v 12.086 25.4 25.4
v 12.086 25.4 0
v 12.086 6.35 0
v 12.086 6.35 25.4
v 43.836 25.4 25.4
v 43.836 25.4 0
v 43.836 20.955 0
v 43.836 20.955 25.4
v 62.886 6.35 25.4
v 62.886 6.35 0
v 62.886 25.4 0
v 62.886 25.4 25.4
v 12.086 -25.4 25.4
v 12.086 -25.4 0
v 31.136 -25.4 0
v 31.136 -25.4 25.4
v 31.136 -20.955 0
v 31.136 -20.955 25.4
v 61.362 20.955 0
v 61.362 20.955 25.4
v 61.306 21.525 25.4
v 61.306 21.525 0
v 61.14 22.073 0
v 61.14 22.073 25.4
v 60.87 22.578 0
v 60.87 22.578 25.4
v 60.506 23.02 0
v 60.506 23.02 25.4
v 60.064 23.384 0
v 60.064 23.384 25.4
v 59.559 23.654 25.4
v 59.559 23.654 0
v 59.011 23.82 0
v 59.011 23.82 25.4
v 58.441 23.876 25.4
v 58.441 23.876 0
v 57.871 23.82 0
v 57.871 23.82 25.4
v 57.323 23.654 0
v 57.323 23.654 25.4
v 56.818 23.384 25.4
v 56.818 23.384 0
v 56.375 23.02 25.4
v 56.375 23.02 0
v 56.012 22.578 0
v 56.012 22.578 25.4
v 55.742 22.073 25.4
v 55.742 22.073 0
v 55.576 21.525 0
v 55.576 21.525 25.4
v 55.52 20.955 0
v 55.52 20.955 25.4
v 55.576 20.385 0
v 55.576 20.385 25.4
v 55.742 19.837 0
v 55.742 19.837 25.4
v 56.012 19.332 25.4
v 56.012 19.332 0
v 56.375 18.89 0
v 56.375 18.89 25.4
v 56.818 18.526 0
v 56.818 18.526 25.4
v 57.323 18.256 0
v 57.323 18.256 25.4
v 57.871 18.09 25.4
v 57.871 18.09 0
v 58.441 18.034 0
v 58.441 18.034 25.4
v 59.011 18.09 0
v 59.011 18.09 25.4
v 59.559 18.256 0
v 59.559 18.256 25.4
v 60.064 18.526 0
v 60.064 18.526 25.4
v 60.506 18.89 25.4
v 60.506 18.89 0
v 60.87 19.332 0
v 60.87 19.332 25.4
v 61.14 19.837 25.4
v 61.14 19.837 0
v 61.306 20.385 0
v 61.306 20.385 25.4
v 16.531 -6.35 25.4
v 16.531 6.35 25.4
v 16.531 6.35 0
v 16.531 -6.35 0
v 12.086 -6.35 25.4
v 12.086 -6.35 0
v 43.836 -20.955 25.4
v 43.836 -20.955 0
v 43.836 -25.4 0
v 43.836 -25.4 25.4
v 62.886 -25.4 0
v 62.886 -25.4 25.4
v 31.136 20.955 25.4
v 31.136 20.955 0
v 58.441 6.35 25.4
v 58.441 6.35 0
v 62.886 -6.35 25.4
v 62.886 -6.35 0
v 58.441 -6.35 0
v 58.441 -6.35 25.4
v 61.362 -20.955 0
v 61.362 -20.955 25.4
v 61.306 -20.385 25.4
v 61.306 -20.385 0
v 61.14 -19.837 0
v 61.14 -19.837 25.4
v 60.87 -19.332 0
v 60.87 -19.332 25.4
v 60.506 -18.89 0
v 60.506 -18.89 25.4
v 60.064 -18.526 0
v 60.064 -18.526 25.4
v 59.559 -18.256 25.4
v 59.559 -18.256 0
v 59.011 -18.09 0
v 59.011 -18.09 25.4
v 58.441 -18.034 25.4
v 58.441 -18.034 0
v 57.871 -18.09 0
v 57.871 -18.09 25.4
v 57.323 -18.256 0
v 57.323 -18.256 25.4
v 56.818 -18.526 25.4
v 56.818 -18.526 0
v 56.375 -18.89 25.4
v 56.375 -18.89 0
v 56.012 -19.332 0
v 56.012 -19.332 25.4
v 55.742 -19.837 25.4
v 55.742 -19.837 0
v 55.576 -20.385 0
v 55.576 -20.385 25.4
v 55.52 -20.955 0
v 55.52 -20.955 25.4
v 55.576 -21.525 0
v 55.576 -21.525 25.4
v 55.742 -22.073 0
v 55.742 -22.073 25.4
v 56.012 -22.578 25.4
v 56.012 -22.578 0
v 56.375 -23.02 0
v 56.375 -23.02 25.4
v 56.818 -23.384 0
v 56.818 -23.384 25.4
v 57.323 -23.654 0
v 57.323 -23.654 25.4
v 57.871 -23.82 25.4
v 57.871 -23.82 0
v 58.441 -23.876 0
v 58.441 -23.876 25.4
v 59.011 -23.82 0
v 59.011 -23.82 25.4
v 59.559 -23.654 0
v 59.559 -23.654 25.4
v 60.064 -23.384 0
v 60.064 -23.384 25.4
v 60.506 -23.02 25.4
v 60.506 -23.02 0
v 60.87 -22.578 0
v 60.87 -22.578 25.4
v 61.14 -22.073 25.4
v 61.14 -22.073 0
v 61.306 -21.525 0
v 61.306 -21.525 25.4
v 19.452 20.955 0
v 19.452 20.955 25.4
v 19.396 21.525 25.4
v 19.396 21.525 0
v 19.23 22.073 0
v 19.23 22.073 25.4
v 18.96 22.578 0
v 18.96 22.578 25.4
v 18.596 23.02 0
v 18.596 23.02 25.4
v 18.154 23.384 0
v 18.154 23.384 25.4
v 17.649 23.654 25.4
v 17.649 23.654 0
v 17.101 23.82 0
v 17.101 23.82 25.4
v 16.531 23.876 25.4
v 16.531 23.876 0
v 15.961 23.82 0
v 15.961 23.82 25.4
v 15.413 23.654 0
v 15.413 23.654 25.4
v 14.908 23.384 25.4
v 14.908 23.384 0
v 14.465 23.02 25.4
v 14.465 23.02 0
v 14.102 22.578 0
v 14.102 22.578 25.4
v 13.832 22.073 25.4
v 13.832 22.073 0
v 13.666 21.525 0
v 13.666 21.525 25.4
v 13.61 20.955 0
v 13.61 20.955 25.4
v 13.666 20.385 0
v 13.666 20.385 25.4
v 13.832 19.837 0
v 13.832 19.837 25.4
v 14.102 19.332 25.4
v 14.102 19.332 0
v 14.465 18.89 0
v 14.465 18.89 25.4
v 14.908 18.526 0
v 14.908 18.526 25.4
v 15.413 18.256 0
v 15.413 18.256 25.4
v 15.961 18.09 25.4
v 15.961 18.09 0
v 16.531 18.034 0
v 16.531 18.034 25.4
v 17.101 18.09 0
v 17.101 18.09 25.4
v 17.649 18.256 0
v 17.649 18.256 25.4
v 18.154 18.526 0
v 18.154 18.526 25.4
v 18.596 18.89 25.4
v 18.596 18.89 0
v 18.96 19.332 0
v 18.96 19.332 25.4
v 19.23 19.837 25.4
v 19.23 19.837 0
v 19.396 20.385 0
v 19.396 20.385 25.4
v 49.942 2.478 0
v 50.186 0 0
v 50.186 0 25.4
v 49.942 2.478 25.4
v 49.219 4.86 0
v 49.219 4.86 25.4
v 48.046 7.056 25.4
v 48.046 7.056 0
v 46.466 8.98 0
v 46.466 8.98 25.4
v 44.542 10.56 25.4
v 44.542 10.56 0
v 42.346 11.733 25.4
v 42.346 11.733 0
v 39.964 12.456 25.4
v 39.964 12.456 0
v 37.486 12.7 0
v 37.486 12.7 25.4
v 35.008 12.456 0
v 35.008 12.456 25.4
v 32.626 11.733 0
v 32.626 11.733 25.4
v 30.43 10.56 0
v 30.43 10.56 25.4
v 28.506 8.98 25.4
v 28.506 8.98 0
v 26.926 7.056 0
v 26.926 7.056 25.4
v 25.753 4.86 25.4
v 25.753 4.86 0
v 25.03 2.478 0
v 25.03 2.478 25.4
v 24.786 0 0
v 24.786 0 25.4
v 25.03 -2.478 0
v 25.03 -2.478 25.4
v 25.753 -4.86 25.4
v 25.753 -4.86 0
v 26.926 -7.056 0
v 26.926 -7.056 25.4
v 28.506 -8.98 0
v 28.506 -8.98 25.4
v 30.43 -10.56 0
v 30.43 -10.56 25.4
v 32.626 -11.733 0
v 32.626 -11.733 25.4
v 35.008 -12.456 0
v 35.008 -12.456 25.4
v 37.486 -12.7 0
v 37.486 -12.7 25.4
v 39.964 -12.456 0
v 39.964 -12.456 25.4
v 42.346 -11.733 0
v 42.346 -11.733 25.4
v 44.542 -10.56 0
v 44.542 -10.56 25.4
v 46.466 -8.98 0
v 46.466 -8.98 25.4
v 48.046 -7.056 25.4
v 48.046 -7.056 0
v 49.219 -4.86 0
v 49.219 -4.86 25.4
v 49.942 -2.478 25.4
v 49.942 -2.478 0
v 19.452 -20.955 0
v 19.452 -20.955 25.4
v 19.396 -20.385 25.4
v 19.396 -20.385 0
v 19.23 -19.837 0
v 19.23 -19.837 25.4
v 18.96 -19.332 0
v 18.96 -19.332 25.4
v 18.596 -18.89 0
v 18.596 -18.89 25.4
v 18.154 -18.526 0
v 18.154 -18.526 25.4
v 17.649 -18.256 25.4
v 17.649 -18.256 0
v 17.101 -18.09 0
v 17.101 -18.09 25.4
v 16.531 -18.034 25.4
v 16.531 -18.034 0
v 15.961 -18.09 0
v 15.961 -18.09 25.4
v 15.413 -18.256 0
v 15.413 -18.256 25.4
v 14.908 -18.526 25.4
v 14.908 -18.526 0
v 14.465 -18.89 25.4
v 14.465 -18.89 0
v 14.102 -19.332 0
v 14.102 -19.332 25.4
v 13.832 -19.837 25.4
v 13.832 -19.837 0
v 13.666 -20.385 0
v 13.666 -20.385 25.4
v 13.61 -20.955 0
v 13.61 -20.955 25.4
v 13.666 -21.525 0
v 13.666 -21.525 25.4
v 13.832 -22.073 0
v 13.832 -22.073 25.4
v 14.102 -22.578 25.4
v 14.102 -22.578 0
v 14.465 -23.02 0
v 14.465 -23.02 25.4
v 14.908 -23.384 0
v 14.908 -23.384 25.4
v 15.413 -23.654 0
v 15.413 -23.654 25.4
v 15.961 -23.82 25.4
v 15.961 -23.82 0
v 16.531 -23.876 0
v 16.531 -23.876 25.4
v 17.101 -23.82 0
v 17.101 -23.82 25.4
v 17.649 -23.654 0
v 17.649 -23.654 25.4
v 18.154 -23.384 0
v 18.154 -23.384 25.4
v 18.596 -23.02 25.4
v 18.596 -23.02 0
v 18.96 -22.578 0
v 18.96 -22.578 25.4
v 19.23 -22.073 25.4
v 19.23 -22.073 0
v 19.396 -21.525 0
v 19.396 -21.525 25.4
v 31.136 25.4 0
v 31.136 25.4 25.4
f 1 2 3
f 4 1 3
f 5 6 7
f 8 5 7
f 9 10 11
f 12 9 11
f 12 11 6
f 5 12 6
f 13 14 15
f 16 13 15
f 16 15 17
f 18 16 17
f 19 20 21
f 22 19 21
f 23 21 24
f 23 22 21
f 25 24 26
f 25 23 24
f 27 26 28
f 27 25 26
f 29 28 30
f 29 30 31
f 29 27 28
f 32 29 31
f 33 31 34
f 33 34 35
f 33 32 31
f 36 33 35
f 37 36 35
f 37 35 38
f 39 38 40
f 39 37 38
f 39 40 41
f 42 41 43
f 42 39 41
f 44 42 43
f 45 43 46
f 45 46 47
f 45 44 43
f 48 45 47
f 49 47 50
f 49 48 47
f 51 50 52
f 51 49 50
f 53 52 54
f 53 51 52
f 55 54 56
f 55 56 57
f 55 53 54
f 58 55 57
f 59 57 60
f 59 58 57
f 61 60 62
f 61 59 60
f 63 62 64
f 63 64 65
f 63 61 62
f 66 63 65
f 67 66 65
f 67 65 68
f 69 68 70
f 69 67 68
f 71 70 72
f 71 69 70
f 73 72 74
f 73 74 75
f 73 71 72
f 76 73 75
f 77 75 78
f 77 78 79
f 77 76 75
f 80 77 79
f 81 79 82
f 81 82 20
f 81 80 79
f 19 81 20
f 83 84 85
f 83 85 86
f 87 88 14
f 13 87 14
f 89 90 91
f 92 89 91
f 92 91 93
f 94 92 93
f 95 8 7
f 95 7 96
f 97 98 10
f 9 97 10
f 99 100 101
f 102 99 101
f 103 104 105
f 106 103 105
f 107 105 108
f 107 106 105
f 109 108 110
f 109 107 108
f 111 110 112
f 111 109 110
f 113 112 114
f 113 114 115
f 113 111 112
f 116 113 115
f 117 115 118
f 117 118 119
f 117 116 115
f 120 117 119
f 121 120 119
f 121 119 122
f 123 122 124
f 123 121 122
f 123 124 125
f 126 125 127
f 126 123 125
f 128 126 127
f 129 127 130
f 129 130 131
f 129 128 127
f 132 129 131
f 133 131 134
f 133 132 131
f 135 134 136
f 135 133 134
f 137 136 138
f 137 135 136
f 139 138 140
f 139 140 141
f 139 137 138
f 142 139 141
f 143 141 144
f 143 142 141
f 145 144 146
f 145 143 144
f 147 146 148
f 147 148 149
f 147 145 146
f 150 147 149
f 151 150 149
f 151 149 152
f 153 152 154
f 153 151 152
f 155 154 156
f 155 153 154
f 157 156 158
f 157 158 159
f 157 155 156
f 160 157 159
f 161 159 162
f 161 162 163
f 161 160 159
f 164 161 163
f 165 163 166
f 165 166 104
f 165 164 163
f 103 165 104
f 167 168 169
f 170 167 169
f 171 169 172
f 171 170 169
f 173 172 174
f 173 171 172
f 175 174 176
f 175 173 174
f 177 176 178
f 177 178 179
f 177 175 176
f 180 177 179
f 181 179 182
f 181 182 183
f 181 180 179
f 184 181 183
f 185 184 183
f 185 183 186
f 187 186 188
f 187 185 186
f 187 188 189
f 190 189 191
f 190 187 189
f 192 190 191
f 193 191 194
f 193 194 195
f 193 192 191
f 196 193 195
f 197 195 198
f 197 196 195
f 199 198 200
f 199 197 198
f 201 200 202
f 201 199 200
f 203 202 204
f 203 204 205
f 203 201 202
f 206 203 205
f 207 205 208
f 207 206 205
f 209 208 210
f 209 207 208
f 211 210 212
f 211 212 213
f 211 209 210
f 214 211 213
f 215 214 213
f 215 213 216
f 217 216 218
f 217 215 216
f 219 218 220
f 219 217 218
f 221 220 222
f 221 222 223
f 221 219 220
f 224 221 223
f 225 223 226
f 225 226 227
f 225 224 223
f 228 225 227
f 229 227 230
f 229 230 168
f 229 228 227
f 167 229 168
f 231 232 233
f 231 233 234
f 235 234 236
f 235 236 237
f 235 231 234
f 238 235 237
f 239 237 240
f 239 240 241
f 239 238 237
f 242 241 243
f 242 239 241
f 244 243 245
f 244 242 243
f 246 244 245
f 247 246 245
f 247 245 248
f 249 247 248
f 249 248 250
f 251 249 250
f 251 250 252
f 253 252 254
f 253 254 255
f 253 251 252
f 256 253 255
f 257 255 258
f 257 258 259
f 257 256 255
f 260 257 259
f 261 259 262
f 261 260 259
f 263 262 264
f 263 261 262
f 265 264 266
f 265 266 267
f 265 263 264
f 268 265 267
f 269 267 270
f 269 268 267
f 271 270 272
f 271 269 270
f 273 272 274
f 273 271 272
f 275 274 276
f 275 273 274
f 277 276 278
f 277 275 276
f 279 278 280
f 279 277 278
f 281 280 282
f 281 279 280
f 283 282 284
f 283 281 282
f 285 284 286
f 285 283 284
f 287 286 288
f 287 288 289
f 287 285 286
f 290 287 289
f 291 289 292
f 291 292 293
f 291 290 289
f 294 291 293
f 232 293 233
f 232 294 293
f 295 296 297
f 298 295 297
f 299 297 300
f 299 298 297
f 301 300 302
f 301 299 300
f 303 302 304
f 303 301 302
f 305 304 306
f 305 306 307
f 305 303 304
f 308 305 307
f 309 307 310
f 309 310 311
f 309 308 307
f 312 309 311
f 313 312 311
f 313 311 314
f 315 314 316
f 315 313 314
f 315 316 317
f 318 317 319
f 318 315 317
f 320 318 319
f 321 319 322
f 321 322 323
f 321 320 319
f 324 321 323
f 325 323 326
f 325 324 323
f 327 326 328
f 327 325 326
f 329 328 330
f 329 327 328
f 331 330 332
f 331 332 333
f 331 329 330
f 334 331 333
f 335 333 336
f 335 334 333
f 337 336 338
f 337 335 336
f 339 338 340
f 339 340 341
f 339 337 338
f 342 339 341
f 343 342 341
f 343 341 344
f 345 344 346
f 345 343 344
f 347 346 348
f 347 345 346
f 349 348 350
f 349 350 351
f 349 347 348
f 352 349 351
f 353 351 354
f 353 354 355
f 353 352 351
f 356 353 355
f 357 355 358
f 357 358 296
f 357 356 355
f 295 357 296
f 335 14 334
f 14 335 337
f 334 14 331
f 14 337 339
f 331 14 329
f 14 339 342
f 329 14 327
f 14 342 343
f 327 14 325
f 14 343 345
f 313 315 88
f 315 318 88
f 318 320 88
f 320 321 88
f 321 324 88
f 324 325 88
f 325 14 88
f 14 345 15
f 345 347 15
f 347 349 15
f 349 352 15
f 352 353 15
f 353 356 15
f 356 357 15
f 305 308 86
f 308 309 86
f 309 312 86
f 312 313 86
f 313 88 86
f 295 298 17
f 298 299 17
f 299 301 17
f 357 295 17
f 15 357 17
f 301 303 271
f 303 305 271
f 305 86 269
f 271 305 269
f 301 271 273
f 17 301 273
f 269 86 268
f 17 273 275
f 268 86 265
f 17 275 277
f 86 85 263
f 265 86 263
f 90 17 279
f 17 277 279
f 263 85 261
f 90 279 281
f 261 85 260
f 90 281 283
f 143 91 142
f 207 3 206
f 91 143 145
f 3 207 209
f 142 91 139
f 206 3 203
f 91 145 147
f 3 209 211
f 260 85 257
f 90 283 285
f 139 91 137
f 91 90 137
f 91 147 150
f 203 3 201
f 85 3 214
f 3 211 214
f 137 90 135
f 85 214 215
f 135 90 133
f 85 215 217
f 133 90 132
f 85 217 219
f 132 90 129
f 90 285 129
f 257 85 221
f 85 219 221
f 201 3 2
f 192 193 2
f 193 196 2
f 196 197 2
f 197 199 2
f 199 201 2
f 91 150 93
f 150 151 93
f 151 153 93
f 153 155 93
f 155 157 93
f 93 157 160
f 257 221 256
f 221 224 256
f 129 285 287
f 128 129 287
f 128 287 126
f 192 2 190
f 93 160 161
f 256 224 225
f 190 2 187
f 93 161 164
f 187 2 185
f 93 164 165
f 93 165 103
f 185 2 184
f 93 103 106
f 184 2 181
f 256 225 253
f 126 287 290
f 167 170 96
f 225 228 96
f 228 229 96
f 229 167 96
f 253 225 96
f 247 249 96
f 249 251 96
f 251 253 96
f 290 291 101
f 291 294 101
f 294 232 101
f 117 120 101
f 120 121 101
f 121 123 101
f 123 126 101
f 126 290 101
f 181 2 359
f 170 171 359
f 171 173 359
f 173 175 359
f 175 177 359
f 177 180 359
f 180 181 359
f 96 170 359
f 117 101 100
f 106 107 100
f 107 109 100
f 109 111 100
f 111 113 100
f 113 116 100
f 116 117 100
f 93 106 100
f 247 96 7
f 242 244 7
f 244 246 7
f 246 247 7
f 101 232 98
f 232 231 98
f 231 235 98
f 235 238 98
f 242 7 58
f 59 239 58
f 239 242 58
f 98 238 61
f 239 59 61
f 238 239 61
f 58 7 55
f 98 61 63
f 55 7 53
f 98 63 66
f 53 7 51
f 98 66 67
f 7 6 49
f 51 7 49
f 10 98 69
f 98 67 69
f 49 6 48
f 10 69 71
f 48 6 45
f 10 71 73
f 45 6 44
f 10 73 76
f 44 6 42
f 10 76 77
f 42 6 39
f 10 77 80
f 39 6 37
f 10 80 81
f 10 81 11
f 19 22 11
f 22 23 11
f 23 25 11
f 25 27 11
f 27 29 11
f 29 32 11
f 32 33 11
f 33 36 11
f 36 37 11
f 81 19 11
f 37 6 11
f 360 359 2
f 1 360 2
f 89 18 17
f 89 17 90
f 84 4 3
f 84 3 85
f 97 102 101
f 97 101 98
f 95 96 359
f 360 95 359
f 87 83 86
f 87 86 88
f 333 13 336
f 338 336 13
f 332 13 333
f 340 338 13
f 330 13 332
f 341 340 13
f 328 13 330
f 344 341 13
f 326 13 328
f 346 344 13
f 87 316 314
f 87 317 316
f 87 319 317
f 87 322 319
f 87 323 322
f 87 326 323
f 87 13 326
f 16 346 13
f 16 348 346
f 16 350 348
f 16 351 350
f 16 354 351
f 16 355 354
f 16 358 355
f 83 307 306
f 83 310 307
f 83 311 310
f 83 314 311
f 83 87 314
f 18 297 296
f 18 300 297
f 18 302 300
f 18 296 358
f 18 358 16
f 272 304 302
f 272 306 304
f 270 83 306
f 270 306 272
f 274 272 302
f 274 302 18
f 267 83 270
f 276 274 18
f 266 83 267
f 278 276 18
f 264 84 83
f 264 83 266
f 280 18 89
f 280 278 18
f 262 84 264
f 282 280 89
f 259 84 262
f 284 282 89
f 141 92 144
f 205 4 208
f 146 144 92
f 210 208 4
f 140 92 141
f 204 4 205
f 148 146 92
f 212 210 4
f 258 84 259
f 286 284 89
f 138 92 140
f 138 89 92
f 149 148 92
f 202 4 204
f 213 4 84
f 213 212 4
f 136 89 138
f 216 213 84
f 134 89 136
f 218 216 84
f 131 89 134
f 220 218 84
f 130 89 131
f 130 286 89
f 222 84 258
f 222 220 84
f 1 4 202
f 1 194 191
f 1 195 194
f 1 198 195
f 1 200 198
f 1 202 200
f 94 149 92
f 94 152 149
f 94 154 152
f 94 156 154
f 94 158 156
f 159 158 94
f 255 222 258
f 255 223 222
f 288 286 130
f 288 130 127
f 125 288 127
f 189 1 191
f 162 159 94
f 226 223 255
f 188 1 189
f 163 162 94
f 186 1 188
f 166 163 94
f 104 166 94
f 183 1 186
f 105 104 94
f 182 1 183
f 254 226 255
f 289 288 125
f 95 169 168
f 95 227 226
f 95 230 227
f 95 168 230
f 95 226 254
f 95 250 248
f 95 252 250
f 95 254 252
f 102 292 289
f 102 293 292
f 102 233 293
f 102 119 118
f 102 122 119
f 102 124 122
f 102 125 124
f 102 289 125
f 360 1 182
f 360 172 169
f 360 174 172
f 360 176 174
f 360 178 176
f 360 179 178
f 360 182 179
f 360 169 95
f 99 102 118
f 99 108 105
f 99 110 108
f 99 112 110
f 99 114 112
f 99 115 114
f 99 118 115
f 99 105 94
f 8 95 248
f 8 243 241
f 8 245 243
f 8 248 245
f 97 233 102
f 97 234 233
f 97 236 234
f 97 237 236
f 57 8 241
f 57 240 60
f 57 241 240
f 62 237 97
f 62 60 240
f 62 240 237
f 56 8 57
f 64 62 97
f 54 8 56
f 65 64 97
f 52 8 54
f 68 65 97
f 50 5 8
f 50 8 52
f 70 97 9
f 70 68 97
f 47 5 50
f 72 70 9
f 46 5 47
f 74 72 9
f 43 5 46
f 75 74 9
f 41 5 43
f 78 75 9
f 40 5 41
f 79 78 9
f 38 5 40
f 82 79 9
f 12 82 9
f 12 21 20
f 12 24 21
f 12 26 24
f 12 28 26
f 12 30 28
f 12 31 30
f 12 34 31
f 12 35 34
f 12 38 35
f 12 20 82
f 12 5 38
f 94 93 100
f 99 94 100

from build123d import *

# Parameters (mm, degrees)
F0_R     = 2.921
F0_R_2   = 12.7
F1_DEPTH = 25.4


# Not quite as in the source:
# - the program builds the solid bodies; features that only make, move or delete a surface that nothing else refers to are left out


with BuildPart() as f1:
    # F0 (on Top) → F1 (new body)
    with BuildSketch(Plane.XY):
        Polygon((31.1358614907, 25.4), (12.0858614907, 25.4), (12.0858614907, 6.35), (16.5308614907, 6.35), (16.5308614907, -6.35), (12.0858614907, -6.35), (12.0858614907, -25.4), (31.1358614907, -25.4), (31.1358614907, -20.955), (43.8358614907, -20.955), (43.8358614907, -25.4), (62.8858614907, -25.4), (62.8858614907, -6.35), (58.4408614907, -6.35), (58.4408614907, 6.35), (62.8858614907, 6.35), (62.8858614907, 25.4), (43.8358614907, 25.4), (43.8358614907, 20.955), (31.1358614907, 20.955), align=None)
        with Locations((16.5308614907, -20.955)):
            Circle(F0_R, mode=Mode.SUBTRACT)
        with Locations((37.4858614907, 0)):
            Circle(F0_R_2, mode=Mode.SUBTRACT)
        with Locations((58.4408614907, -20.955)):
            Circle(F0_R, mode=Mode.SUBTRACT)
        with Locations((16.5308614907, 20.955)):
            Circle(F0_R, mode=Mode.SUBTRACT)
        with Locations((58.4408614907, 20.955)):
            Circle(F0_R, mode=Mode.SUBTRACT)
    extrude(amount=F1_DEPTH)


solid = f1.part
